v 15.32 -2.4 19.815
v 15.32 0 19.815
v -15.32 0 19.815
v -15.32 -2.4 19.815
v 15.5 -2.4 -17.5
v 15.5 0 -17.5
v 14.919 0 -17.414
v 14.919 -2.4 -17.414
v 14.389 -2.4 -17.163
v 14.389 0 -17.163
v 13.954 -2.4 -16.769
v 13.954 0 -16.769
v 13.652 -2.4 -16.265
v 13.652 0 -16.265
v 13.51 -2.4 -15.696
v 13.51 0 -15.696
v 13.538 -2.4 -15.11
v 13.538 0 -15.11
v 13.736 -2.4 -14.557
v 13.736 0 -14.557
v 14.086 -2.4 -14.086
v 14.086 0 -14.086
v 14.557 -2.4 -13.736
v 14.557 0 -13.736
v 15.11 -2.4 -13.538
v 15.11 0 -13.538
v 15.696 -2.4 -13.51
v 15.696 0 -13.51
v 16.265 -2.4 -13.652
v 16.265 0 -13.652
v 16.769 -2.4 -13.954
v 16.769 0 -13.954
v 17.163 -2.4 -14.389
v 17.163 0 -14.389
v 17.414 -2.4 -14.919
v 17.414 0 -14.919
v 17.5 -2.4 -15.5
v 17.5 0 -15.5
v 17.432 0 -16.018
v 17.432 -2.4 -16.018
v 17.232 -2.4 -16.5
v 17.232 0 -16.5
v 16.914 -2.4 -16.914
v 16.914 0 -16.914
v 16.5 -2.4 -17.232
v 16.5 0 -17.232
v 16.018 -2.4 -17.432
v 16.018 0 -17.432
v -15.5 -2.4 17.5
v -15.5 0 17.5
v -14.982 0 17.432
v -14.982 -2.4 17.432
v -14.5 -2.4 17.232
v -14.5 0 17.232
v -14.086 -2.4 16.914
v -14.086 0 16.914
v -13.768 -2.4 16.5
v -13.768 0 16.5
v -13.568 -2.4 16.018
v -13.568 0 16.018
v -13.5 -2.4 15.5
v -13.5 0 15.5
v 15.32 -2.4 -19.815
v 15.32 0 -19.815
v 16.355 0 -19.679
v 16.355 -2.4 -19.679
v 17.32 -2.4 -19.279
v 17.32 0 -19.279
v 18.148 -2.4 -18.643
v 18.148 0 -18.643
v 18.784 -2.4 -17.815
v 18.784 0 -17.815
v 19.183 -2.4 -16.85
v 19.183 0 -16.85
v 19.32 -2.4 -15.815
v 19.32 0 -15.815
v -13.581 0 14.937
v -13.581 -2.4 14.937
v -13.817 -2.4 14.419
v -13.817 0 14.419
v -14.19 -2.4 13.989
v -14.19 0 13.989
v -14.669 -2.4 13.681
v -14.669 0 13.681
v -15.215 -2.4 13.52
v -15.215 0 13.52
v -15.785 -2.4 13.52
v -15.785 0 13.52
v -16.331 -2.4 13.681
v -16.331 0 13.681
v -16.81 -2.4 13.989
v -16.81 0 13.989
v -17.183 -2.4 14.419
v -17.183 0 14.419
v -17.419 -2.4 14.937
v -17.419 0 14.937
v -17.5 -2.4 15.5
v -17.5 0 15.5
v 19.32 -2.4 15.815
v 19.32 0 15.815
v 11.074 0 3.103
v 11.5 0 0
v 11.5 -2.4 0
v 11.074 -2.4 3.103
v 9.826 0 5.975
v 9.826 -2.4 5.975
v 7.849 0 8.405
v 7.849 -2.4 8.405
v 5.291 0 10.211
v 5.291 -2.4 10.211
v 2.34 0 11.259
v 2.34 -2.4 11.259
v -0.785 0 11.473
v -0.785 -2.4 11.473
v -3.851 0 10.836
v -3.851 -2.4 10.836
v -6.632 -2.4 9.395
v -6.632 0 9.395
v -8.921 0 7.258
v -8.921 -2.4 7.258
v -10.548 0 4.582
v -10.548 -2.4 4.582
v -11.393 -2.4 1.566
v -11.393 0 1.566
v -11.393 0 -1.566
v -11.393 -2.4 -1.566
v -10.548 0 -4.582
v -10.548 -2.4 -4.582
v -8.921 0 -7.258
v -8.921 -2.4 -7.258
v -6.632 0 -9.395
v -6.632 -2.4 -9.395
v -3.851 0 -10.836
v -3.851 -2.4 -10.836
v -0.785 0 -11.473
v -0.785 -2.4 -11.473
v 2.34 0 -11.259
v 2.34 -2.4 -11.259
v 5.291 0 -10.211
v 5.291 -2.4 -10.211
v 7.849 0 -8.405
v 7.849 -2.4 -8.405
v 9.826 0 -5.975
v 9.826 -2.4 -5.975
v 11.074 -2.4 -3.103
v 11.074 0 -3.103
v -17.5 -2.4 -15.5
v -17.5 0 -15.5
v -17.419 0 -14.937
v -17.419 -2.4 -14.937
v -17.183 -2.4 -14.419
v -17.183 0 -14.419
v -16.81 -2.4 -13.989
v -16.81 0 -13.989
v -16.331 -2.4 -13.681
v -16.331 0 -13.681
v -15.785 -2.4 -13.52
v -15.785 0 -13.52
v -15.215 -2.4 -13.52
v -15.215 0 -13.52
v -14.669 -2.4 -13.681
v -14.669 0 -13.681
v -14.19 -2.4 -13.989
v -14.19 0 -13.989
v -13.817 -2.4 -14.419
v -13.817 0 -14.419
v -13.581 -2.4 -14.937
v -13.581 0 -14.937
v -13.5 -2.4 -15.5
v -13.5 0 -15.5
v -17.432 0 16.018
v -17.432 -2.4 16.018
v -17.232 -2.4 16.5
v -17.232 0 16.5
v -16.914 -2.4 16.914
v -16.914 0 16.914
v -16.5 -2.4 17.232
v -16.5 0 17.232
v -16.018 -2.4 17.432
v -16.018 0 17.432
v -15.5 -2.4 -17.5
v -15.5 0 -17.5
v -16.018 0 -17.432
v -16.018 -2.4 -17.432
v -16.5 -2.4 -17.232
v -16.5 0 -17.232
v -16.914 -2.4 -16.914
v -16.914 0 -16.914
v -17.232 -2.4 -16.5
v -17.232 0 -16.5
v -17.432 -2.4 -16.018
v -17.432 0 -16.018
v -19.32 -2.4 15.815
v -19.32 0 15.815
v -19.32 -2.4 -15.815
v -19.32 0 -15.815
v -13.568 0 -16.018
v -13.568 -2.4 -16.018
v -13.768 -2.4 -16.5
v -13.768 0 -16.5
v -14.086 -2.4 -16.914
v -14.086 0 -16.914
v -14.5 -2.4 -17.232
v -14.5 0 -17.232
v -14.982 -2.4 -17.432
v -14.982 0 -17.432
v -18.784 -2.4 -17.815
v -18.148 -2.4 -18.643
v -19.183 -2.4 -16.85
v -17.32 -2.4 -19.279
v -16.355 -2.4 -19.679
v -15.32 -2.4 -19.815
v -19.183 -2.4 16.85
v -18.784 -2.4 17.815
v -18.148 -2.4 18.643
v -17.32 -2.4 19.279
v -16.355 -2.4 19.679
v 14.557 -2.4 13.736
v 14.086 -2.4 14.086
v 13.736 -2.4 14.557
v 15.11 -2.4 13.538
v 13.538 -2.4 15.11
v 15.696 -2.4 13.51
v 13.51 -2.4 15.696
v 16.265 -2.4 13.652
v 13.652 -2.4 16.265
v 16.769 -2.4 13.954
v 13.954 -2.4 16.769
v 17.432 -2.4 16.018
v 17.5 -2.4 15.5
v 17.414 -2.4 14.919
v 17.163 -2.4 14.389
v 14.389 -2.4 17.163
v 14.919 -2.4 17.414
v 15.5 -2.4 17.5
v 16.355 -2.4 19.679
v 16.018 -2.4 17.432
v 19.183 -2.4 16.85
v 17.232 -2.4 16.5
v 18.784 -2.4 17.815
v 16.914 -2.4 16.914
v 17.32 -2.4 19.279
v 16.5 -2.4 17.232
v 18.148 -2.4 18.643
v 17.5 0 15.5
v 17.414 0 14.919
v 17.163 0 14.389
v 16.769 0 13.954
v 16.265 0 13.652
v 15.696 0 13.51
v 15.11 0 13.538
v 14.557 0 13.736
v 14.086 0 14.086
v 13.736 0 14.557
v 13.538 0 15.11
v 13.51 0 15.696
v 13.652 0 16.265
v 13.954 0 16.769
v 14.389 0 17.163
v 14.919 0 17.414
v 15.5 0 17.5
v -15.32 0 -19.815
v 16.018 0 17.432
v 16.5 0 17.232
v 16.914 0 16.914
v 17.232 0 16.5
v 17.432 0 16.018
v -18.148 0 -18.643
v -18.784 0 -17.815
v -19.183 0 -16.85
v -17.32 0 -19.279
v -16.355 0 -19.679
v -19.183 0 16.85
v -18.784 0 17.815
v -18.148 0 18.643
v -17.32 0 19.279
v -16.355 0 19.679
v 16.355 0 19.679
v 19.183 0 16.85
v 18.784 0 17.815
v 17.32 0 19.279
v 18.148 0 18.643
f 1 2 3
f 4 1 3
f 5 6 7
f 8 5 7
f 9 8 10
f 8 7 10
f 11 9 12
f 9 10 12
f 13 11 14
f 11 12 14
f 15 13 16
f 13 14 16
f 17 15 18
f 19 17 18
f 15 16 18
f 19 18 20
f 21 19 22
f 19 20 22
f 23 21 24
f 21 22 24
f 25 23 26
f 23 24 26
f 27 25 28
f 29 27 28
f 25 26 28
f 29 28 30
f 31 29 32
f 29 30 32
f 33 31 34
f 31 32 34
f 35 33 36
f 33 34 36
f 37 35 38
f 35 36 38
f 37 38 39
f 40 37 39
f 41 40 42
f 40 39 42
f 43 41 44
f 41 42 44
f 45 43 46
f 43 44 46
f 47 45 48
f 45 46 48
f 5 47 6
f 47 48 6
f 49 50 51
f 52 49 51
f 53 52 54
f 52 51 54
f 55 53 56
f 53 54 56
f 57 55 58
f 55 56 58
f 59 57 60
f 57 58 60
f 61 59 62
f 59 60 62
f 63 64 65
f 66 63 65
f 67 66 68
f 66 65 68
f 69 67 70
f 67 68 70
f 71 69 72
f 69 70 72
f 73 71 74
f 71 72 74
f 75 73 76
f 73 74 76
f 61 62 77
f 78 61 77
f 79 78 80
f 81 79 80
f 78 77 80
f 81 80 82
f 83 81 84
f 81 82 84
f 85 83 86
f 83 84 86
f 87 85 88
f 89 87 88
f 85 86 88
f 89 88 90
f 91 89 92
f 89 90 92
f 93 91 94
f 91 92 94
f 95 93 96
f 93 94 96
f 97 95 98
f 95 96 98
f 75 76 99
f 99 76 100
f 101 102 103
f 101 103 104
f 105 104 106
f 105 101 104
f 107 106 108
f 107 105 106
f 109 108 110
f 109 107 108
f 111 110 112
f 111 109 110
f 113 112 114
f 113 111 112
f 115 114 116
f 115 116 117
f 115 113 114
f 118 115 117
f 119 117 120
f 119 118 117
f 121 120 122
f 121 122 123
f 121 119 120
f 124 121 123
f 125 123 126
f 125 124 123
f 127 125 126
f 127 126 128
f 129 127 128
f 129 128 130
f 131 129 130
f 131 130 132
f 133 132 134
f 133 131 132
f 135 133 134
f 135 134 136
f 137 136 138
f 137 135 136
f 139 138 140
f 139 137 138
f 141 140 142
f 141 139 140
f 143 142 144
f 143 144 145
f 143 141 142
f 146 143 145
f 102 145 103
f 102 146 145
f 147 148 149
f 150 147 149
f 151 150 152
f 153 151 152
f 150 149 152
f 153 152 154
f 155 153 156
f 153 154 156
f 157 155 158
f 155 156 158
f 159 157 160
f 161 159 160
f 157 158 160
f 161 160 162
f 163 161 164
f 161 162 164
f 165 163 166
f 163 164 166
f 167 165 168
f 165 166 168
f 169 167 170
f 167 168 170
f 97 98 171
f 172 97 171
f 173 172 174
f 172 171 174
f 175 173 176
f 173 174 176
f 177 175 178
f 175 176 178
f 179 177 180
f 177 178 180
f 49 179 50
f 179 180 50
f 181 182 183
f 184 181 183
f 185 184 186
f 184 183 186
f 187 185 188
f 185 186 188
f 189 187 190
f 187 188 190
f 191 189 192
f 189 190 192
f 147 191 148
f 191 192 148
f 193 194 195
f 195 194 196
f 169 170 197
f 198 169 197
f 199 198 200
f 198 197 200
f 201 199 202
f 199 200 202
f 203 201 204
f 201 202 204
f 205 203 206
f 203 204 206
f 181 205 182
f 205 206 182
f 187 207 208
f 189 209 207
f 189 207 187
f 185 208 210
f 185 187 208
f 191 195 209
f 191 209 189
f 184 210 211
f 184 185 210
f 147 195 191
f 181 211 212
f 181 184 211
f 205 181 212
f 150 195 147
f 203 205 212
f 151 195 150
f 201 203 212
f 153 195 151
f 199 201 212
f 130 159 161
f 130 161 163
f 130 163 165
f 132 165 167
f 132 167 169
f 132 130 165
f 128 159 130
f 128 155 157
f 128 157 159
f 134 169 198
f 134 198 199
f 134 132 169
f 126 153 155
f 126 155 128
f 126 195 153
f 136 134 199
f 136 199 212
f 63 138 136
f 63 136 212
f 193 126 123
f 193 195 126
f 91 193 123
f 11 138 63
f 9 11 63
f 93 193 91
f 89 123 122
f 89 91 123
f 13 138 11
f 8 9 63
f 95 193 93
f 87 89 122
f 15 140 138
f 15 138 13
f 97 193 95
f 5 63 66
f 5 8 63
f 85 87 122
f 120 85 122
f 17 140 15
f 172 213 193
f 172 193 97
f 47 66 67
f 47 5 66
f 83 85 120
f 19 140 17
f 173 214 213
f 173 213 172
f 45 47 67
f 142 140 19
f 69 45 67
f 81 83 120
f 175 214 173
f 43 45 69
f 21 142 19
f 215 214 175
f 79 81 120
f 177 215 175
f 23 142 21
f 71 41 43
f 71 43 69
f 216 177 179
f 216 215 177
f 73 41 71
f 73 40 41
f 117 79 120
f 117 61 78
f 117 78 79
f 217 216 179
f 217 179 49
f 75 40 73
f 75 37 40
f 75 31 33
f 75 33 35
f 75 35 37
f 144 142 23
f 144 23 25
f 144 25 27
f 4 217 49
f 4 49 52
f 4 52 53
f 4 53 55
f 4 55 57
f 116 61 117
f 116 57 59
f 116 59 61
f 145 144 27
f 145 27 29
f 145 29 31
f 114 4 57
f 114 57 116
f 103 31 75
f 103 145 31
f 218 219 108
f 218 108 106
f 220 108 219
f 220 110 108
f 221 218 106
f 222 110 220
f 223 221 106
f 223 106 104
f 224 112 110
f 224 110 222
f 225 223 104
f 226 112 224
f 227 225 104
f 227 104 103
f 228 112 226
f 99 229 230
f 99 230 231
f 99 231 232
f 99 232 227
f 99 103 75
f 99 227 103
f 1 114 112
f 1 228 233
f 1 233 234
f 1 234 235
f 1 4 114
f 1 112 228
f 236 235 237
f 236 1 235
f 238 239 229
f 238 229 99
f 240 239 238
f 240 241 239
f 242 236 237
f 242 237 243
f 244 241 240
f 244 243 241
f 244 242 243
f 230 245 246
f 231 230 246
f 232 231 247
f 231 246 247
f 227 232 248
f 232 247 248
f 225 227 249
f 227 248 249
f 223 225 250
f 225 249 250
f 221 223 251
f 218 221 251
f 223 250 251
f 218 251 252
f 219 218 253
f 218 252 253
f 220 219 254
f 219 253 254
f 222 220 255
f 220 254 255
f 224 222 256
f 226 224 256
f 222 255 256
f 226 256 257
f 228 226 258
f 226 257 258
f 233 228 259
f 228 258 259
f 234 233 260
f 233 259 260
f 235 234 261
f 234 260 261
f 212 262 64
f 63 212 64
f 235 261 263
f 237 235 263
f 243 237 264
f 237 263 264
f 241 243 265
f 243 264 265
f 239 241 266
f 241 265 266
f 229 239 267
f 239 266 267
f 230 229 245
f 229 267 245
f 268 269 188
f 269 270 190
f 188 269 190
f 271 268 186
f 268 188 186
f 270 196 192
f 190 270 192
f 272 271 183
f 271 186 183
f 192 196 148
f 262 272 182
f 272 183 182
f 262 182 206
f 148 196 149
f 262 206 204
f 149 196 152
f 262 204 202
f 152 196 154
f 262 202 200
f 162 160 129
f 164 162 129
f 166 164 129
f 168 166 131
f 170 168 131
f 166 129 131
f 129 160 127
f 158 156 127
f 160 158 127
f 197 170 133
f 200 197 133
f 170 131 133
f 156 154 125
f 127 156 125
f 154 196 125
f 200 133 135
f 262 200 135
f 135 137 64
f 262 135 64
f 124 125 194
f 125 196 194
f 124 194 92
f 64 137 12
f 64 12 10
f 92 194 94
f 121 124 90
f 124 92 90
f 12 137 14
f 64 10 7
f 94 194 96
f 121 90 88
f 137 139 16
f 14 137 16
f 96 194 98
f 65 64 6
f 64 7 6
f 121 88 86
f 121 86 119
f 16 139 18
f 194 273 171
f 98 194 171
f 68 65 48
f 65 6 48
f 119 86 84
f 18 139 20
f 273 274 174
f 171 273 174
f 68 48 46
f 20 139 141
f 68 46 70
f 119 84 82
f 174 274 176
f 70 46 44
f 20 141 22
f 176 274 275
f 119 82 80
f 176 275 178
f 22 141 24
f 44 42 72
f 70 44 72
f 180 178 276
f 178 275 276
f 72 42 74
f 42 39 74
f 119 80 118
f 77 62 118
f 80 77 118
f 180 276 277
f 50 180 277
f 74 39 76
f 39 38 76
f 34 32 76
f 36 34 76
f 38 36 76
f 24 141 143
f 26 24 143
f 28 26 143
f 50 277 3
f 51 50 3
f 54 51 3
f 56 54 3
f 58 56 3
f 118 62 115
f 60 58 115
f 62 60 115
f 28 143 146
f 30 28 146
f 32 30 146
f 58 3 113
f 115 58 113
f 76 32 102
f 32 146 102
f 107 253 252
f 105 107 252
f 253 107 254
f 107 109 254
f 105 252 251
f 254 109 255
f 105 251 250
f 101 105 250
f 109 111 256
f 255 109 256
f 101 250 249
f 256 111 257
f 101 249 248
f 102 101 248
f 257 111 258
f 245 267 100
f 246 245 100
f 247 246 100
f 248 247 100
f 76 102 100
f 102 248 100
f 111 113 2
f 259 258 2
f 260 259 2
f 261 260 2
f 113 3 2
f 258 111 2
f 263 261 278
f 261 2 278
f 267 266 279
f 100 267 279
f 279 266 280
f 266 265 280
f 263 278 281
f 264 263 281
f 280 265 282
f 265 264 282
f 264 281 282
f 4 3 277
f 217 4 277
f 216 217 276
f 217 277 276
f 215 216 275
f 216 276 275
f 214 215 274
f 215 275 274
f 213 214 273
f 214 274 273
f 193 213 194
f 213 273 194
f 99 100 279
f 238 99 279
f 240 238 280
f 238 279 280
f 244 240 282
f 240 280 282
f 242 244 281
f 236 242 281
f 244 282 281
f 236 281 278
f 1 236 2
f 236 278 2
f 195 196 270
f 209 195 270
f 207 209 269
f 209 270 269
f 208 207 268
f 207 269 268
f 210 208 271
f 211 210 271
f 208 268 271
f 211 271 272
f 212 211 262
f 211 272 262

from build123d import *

# Parameters (mm, degrees)
F0_R     = 11.5
F1_DEPTH = 2.4


with BuildPart() as f1:
    # F0 (on Front) → F1 (new body)
    with BuildSketch(Plane.XZ):
        with BuildLine():
            Line((15.31951195, 19.8149923235), (-15.31951195, 19.8149923235))
            ThreePointArc((-15.31951195, 19.8149923235), (-18.1479390748, 18.6434194483), (-19.31951195, 15.8149923235))
            Line((-19.31951195, 15.8149923235), (-19.31951195, -15.8149923235))
            ThreePointArc((-19.31951195, -15.8149923235), (-18.1479390748, -18.6434194483), (-15.31951195, -19.8149923235))
            Line((-15.31951195, -19.8149923235), (15.31951195, -19.8149923235))
            ThreePointArc((15.31951195, -19.8149923235), (18.1479390748, -18.6434194483), (19.31951195, -15.8149923235))
            Line((19.31951195, -15.8149923235), (19.31951195, 15.8149923235))
            ThreePointArc((19.31951195, 15.8149923235), (18.1479390748, 18.6434194483), (15.31951195, 19.8149923235))
        make_face()
        with BuildLine():
            ThreePointArc((-17.5, 15.5), (-16.9142135624, 16.9142135624), (-15.5, 17.5))
            Line((-15.5, 17.5), (15.5, 17.5))
            ThreePointArc((15.5, 17.5), (16.9142135624, 16.9142135624), (17.5, 15.5))
            Line((17.5, 15.5), (17.5, -15.5))
            ThreePointArc((17.5, -15.5), (16.9142135624, -16.9142135624), (15.5, -17.5))
            Line((15.5, -17.5), (-15.5, -17.5))
            ThreePointArc((-15.5, -17.5), (-16.9142135624, -16.9142135624), (-17.5, -15.5))
            Line((-17.5, -15.5), (-17.5, 15.5))
        make_face(mode=Mode.SUBTRACT)
        with BuildLine():
            ThreePointArc((-15.5, 17.5), (-14.0857864376, 16.9142135624), (-13.5, 15.5))
            ThreePointArc((-13.5, 15.5), (-15.5, 13.5), (-17.5, 15.5))
            Line((-17.5, 15.5), (-17.5, -15.5))
            ThreePointArc((-17.5, -15.5), (-15.5, -13.5), (-13.5, -15.5))
            ThreePointArc((-13.5, -15.5), (-14.0857864376, -16.9142135624), (-15.5, -17.5))
            Line((-15.5, -17.5), (15.5, -17.5))
            ThreePointArc((15.5, -17.5), (14.0857864376, -14.0857864376), (17.5, -15.5))
            Line((17.5, -15.5), (17.5, 15.5))
            ThreePointArc((17.5, 15.5), (14.0857864376, 14.0857864376), (15.5, 17.5))
            Line((15.5, 17.5), (-15.5, 17.5))
        make_face()
        Circle(F0_R, mode=Mode.SUBTRACT)
    extrude(amount=F1_DEPTH)


solid = f1.part
